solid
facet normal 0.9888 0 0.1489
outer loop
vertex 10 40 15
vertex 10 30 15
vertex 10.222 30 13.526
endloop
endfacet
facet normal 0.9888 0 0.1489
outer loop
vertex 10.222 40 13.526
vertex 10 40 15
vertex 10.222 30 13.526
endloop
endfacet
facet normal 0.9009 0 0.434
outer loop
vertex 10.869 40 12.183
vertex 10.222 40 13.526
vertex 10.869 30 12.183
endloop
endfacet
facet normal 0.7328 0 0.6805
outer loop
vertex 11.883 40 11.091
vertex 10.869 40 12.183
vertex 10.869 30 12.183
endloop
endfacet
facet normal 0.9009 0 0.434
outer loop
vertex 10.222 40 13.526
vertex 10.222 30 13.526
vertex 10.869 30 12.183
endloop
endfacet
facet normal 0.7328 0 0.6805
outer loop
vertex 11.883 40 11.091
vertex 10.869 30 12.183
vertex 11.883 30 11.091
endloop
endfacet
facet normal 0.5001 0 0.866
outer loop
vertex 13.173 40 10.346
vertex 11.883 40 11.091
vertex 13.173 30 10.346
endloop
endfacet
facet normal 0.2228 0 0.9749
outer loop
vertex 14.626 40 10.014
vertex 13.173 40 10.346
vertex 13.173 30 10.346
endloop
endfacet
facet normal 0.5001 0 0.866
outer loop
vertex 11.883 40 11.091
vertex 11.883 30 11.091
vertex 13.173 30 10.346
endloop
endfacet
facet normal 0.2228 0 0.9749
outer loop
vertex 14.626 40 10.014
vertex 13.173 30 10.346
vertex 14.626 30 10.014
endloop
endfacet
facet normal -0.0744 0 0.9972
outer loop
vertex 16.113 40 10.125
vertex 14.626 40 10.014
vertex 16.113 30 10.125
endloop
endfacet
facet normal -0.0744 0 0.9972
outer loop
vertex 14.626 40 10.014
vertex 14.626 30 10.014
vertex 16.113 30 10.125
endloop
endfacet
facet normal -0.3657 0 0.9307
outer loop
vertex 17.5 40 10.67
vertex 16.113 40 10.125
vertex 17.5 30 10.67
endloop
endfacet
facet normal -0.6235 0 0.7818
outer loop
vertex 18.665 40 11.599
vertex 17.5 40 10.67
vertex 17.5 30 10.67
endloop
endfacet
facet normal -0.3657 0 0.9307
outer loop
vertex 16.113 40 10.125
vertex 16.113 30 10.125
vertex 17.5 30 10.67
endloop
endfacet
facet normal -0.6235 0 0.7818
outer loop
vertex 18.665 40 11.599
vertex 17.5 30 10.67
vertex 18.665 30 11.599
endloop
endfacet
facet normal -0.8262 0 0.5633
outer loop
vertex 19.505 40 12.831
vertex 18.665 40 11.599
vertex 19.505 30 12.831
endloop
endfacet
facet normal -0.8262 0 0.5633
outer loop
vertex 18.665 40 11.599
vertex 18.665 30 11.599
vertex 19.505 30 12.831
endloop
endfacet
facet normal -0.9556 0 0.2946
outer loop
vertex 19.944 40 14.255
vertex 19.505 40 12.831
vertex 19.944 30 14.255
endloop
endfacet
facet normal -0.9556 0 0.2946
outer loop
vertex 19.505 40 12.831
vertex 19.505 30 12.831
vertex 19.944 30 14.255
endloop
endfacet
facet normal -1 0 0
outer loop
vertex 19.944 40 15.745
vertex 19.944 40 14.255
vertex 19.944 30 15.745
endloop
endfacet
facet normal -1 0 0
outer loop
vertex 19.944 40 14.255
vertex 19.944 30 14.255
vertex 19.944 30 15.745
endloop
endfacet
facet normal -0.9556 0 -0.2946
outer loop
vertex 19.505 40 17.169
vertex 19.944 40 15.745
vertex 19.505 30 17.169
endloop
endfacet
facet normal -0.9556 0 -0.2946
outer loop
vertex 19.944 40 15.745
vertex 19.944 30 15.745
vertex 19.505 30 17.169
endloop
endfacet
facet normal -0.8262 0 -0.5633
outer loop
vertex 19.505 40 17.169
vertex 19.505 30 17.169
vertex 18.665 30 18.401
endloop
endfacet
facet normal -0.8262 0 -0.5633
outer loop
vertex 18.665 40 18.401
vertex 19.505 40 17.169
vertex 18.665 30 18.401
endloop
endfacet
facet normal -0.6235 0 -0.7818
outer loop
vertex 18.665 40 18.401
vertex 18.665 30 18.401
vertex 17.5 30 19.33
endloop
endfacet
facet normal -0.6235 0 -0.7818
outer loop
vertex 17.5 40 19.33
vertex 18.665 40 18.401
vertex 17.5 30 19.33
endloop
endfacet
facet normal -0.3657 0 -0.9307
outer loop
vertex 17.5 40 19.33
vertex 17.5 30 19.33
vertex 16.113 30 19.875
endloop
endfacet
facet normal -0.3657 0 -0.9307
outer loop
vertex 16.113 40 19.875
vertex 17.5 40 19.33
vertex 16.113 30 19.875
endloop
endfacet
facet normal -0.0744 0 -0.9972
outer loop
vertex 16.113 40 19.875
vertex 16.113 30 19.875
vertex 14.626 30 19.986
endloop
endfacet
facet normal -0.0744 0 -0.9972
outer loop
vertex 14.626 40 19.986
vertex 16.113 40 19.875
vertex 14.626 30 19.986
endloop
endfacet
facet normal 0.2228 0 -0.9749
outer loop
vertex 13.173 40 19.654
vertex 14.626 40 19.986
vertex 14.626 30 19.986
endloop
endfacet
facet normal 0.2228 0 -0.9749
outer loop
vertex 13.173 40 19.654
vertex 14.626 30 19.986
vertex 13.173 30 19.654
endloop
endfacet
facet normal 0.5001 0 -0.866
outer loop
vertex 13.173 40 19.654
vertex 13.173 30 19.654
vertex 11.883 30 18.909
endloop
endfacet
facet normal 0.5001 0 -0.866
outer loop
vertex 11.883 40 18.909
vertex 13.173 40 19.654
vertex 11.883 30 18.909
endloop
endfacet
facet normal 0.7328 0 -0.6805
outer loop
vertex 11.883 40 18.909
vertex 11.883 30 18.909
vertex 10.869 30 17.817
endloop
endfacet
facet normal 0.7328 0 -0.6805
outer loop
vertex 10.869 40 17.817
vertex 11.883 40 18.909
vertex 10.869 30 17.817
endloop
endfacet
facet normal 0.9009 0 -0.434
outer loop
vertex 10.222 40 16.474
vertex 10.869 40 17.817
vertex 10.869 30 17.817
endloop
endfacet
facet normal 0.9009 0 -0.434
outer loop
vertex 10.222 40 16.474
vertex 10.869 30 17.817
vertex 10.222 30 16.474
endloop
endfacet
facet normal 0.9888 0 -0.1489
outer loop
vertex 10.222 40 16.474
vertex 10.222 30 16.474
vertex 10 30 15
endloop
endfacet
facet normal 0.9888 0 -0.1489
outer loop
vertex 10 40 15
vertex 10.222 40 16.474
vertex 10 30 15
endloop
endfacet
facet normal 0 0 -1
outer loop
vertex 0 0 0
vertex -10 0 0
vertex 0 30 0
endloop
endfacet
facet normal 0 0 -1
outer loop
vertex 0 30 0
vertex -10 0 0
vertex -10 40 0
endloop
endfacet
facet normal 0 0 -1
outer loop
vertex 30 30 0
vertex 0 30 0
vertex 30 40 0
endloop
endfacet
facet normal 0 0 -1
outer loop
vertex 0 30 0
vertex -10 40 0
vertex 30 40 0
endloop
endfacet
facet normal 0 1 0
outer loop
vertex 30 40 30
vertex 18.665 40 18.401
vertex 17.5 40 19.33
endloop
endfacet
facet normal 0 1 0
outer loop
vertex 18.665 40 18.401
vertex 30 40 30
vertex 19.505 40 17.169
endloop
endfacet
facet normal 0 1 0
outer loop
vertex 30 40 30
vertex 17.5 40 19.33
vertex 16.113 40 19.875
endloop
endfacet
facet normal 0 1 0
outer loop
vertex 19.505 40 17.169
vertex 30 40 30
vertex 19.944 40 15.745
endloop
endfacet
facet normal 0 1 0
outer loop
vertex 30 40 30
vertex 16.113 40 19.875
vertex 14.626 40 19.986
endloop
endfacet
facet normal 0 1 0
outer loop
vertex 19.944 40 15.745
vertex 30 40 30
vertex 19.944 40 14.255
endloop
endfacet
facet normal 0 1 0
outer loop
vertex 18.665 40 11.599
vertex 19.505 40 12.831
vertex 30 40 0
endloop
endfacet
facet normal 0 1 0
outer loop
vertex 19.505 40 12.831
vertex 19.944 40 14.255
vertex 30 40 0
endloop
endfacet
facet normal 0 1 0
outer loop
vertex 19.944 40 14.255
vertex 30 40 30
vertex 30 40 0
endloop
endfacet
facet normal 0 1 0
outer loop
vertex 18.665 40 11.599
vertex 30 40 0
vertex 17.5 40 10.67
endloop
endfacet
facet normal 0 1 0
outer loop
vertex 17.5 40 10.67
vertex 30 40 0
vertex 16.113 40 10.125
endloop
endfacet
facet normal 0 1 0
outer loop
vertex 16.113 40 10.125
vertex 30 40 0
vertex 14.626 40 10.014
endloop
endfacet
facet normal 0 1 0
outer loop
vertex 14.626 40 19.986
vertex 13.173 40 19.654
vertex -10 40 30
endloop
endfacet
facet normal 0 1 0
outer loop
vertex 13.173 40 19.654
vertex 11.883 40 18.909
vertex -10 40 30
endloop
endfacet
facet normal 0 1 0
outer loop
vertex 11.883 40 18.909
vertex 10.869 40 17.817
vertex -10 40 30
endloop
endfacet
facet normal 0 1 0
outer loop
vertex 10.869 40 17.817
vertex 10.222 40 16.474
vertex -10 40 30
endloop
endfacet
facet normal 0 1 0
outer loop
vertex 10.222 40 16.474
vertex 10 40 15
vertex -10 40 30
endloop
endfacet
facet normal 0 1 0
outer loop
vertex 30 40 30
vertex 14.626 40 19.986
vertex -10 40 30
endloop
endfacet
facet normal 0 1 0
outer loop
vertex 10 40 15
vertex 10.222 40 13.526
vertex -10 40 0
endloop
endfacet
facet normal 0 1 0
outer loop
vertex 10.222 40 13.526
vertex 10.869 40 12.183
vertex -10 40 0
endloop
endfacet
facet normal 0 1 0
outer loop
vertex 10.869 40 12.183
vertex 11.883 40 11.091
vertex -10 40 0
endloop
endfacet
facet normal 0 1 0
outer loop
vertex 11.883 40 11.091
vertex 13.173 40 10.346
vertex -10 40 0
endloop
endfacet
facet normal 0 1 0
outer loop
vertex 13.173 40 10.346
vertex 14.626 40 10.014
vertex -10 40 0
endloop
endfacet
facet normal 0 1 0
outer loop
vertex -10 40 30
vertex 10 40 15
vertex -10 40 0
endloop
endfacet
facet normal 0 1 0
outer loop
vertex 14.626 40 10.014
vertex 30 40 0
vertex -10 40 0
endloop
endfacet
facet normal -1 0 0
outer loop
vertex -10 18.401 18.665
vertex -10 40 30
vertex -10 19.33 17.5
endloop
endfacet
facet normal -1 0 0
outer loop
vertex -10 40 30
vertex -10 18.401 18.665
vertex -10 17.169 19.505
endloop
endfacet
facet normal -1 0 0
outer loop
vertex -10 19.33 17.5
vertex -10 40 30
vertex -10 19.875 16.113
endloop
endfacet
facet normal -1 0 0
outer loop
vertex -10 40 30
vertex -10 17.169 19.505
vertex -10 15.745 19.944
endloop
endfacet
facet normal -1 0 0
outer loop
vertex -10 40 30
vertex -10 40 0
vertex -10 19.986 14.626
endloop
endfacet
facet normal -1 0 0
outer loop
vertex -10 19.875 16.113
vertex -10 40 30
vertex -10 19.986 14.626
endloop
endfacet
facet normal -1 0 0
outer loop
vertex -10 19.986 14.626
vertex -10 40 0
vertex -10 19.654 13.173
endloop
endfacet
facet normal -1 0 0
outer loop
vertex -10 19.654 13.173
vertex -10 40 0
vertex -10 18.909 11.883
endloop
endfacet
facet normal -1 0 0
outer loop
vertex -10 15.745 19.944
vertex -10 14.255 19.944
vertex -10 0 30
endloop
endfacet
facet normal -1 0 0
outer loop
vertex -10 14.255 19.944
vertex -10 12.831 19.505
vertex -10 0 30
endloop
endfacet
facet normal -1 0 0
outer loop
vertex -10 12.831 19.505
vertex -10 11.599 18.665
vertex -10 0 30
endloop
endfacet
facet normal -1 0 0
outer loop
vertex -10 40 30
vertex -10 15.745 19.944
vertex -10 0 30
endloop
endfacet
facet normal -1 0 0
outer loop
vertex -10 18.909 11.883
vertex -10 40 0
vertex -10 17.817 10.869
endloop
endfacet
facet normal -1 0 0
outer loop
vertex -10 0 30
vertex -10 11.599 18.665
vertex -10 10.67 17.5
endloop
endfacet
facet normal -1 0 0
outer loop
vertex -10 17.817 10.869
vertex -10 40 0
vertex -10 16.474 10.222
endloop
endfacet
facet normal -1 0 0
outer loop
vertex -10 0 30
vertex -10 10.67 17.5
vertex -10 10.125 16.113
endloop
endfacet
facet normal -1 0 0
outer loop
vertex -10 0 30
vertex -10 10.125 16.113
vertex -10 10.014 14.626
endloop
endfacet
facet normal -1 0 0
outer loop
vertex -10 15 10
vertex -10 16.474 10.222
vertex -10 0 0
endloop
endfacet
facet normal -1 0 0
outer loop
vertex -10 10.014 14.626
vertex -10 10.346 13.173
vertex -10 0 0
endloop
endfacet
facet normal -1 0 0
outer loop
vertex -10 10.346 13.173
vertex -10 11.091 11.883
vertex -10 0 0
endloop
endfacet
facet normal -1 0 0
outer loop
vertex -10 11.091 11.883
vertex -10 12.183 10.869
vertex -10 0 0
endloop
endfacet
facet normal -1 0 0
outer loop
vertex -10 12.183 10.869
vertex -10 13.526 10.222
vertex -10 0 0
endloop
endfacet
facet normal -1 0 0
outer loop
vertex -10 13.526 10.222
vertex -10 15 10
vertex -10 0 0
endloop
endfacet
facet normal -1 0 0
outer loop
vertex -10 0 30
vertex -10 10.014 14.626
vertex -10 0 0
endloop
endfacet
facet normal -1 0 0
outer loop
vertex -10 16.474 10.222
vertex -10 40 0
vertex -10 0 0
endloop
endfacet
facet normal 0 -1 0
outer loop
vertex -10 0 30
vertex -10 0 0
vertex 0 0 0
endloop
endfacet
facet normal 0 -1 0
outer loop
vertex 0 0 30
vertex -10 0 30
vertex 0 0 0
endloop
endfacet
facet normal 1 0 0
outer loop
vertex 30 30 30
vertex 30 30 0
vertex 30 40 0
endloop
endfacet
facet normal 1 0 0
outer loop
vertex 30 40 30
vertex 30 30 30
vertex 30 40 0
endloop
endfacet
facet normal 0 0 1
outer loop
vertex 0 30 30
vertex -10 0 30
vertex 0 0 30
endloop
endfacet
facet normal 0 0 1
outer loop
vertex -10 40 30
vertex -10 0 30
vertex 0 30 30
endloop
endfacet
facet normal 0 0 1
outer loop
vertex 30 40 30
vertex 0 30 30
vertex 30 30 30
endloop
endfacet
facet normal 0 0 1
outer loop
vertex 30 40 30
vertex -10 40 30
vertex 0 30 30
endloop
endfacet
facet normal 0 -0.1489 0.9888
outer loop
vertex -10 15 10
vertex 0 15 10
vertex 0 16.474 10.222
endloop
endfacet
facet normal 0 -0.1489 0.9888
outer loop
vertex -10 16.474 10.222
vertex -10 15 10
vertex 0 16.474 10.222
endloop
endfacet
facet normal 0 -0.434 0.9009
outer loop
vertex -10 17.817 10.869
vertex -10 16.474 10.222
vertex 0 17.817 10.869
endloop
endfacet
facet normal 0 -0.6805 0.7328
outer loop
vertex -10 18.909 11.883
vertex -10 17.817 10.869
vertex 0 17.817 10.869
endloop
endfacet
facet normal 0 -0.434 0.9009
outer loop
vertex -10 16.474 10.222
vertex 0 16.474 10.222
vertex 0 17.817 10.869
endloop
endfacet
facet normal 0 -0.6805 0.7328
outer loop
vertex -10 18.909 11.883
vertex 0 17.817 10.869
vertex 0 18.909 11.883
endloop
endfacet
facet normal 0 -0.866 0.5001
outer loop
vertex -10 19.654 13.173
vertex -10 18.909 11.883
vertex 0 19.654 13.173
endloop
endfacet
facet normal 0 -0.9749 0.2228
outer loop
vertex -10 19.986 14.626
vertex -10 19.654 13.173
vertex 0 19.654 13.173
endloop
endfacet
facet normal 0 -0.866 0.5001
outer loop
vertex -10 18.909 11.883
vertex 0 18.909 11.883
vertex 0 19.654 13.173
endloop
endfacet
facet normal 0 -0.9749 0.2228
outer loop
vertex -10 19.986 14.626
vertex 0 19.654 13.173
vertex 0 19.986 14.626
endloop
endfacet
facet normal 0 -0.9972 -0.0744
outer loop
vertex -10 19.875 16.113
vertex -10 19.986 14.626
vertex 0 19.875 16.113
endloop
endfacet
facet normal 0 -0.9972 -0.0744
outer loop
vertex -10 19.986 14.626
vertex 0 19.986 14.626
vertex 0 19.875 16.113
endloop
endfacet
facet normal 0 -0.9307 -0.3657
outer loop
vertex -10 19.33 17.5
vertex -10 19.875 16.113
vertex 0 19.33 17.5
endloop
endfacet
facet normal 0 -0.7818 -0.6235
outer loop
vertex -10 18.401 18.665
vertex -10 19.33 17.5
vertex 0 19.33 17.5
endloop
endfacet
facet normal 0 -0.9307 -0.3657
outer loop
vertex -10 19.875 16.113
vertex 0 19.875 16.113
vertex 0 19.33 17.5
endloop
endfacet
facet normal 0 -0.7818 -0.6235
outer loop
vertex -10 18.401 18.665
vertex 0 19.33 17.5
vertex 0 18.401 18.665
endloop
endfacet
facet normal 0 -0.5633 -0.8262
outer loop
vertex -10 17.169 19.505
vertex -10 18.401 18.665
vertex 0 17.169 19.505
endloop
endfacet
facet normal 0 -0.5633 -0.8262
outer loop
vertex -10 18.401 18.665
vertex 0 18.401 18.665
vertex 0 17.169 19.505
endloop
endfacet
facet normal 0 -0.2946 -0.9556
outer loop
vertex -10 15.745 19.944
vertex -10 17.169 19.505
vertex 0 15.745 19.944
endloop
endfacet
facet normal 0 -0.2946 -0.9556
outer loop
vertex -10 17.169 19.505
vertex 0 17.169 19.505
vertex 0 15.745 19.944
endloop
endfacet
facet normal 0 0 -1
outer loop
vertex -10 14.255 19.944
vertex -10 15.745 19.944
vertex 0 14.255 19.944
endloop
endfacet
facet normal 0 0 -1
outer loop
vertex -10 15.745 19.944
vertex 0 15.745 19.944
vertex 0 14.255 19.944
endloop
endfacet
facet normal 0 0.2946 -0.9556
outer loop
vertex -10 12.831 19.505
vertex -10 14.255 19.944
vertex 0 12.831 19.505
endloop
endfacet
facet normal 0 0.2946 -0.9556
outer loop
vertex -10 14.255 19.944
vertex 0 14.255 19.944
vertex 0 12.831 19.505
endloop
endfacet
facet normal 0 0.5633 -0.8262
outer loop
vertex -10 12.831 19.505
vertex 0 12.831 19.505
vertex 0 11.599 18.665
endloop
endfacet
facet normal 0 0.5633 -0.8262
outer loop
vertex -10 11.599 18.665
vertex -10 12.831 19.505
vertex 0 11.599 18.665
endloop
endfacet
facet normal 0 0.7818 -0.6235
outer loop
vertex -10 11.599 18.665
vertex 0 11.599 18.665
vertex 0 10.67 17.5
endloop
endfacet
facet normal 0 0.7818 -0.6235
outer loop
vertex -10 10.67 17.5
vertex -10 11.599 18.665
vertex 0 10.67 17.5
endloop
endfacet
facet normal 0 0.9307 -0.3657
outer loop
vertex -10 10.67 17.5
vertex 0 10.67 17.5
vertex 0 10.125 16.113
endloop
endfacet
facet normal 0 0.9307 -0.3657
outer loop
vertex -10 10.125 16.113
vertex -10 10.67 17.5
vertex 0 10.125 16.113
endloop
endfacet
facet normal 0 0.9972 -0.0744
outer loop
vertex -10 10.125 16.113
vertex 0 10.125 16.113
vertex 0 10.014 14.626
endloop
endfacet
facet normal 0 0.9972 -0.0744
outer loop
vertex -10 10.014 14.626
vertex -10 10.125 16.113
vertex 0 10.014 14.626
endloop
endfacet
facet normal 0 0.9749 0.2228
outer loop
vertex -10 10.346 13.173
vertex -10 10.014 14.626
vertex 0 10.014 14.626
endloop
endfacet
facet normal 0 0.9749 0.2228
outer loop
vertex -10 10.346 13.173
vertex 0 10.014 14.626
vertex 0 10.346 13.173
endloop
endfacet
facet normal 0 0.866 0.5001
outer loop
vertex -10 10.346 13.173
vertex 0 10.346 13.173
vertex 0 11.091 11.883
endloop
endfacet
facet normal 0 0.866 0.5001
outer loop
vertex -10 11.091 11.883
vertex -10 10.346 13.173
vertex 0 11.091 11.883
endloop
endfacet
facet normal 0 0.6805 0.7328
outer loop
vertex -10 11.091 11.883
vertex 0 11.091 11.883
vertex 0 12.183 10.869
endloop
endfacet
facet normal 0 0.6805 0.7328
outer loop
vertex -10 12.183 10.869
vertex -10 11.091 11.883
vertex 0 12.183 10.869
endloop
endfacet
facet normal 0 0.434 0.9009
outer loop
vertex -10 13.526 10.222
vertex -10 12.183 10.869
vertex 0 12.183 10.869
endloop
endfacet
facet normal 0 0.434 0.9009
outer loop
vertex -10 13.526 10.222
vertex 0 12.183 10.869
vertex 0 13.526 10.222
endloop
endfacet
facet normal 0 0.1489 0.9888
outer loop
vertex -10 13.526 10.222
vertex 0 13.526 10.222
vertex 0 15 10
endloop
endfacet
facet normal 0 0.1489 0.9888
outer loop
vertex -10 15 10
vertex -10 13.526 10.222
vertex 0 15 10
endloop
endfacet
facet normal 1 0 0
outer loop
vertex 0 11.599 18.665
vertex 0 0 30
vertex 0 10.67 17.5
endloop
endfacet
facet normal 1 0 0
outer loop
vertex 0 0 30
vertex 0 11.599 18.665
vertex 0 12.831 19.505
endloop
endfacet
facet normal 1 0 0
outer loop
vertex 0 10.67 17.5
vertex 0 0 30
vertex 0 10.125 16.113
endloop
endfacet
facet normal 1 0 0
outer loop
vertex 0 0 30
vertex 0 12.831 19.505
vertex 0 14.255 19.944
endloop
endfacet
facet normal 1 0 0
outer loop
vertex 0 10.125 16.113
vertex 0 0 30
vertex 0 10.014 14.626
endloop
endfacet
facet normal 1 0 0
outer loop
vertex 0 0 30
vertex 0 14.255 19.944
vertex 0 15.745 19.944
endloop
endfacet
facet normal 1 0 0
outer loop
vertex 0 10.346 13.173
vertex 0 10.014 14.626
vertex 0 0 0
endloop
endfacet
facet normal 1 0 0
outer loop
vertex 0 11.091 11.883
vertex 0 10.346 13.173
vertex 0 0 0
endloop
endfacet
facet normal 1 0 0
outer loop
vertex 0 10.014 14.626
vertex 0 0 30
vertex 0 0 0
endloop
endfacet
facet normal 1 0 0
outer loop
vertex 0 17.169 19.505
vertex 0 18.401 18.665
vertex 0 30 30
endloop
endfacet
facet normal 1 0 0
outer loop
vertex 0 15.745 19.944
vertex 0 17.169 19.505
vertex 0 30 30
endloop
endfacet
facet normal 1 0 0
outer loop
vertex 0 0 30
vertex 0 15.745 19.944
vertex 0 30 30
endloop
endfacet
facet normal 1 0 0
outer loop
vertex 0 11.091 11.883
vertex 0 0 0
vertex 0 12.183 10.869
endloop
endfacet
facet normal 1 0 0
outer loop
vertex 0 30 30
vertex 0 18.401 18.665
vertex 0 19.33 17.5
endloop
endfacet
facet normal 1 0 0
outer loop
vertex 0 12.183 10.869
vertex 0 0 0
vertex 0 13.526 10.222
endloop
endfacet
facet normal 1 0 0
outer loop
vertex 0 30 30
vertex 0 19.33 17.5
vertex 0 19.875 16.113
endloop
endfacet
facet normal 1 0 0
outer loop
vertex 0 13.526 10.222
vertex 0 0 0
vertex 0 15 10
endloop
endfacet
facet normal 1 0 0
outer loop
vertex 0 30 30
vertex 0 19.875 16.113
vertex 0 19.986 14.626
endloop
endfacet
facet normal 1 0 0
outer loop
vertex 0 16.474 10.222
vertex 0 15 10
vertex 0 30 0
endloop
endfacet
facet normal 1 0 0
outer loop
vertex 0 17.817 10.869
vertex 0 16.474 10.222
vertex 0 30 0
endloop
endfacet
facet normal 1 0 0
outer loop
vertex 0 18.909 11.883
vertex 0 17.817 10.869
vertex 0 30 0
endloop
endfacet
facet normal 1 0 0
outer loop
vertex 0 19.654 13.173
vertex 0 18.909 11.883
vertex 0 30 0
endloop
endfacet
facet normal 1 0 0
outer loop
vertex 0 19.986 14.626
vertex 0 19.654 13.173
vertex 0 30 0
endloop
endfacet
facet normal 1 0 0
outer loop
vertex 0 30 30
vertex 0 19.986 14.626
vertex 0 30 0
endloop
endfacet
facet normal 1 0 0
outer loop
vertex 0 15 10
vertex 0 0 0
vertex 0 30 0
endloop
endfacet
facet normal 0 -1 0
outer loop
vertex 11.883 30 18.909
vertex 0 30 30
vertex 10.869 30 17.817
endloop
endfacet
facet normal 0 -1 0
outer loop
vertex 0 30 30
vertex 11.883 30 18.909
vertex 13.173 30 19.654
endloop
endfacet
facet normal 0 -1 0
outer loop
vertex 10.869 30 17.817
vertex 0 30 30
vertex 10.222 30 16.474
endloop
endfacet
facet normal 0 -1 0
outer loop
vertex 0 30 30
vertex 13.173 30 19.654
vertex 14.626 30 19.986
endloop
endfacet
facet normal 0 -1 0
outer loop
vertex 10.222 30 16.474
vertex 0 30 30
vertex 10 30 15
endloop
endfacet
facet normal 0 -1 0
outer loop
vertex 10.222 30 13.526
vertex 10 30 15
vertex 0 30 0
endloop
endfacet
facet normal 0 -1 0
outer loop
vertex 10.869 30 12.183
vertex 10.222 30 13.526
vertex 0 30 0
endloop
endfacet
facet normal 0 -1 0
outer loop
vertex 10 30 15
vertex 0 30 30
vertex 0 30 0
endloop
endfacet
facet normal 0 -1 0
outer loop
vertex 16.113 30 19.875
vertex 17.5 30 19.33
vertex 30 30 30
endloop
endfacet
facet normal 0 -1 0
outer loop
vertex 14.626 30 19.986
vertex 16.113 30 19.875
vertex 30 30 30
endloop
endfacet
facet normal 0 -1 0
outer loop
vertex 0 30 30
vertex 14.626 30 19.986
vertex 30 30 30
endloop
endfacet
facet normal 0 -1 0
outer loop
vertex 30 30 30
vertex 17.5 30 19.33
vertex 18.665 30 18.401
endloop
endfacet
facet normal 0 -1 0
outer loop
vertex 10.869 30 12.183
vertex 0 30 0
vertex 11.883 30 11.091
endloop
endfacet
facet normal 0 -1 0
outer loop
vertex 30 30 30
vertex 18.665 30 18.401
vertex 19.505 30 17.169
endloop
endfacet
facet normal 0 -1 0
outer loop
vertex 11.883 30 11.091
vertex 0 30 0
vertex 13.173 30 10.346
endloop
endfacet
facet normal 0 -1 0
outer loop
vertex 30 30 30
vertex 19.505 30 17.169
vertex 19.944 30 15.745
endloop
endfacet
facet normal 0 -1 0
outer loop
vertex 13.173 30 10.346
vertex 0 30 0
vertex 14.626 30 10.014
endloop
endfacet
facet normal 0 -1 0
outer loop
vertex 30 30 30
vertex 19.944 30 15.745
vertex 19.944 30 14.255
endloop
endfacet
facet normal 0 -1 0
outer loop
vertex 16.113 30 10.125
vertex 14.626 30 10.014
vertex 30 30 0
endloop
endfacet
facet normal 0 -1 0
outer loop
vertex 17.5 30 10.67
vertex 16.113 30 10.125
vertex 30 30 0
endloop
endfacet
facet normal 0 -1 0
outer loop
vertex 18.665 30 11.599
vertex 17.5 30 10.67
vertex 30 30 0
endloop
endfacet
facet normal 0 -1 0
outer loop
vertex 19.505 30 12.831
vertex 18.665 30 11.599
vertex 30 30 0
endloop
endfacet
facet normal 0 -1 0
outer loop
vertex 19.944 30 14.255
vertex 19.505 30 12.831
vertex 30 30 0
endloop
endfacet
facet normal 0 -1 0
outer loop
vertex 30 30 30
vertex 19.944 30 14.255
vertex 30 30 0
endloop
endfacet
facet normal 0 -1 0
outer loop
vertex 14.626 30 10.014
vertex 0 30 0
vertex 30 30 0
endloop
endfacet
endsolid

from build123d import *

# Parameters (mm, degrees)
EXTRUDE_THIN1_DEPTH     = 30
SKETCH2_R               = 5
CUT_EXTRUDE1_DEPTH      = 31
CUT_EXTRUDE1_DEPTH_BACK = 11
SKETCH3_R               = 5
CUT_EXTRUDE2_DEPTH      = 11


with BuildPart() as part:
    # Sketch1 → Extrude-Thin1 (new body)
    with BuildSketch(Plane.XY):
        Polygon((0, 0), (0, 30), (30, 30), (30, 40), (-10, 40), (-10, 0), align=None)
    extrude(amount=EXTRUDE_THIN1_DEPTH)

    # Sketch2 → Cut-Extrude1 (cut, two sides)
    with BuildSketch(Plane(origin=(0, 30, 0), x_dir=(-1, 0, 0), z_dir=(0, -1, 0))) as cut_extrude1_sk:
        with Locations((-15, -15)):
            Circle(SKETCH2_R)
    extrude(amount=CUT_EXTRUDE1_DEPTH, mode=Mode.SUBTRACT)
    extrude(cut_extrude1_sk.sketch, amount=-CUT_EXTRUDE1_DEPTH_BACK, mode=Mode.SUBTRACT)

    # Sketch3 → Cut-Extrude2 (cut, through all)
    with BuildSketch(Plane(origin=(0, 0, 0), x_dir=(0, 0, -1), z_dir=(1, 0, 0))):
        with Locations((-15, 15)):
            Circle(SKETCH3_R)
    extrude(amount=-CUT_EXTRUDE2_DEPTH, mode=Mode.SUBTRACT)


solid = part.part
